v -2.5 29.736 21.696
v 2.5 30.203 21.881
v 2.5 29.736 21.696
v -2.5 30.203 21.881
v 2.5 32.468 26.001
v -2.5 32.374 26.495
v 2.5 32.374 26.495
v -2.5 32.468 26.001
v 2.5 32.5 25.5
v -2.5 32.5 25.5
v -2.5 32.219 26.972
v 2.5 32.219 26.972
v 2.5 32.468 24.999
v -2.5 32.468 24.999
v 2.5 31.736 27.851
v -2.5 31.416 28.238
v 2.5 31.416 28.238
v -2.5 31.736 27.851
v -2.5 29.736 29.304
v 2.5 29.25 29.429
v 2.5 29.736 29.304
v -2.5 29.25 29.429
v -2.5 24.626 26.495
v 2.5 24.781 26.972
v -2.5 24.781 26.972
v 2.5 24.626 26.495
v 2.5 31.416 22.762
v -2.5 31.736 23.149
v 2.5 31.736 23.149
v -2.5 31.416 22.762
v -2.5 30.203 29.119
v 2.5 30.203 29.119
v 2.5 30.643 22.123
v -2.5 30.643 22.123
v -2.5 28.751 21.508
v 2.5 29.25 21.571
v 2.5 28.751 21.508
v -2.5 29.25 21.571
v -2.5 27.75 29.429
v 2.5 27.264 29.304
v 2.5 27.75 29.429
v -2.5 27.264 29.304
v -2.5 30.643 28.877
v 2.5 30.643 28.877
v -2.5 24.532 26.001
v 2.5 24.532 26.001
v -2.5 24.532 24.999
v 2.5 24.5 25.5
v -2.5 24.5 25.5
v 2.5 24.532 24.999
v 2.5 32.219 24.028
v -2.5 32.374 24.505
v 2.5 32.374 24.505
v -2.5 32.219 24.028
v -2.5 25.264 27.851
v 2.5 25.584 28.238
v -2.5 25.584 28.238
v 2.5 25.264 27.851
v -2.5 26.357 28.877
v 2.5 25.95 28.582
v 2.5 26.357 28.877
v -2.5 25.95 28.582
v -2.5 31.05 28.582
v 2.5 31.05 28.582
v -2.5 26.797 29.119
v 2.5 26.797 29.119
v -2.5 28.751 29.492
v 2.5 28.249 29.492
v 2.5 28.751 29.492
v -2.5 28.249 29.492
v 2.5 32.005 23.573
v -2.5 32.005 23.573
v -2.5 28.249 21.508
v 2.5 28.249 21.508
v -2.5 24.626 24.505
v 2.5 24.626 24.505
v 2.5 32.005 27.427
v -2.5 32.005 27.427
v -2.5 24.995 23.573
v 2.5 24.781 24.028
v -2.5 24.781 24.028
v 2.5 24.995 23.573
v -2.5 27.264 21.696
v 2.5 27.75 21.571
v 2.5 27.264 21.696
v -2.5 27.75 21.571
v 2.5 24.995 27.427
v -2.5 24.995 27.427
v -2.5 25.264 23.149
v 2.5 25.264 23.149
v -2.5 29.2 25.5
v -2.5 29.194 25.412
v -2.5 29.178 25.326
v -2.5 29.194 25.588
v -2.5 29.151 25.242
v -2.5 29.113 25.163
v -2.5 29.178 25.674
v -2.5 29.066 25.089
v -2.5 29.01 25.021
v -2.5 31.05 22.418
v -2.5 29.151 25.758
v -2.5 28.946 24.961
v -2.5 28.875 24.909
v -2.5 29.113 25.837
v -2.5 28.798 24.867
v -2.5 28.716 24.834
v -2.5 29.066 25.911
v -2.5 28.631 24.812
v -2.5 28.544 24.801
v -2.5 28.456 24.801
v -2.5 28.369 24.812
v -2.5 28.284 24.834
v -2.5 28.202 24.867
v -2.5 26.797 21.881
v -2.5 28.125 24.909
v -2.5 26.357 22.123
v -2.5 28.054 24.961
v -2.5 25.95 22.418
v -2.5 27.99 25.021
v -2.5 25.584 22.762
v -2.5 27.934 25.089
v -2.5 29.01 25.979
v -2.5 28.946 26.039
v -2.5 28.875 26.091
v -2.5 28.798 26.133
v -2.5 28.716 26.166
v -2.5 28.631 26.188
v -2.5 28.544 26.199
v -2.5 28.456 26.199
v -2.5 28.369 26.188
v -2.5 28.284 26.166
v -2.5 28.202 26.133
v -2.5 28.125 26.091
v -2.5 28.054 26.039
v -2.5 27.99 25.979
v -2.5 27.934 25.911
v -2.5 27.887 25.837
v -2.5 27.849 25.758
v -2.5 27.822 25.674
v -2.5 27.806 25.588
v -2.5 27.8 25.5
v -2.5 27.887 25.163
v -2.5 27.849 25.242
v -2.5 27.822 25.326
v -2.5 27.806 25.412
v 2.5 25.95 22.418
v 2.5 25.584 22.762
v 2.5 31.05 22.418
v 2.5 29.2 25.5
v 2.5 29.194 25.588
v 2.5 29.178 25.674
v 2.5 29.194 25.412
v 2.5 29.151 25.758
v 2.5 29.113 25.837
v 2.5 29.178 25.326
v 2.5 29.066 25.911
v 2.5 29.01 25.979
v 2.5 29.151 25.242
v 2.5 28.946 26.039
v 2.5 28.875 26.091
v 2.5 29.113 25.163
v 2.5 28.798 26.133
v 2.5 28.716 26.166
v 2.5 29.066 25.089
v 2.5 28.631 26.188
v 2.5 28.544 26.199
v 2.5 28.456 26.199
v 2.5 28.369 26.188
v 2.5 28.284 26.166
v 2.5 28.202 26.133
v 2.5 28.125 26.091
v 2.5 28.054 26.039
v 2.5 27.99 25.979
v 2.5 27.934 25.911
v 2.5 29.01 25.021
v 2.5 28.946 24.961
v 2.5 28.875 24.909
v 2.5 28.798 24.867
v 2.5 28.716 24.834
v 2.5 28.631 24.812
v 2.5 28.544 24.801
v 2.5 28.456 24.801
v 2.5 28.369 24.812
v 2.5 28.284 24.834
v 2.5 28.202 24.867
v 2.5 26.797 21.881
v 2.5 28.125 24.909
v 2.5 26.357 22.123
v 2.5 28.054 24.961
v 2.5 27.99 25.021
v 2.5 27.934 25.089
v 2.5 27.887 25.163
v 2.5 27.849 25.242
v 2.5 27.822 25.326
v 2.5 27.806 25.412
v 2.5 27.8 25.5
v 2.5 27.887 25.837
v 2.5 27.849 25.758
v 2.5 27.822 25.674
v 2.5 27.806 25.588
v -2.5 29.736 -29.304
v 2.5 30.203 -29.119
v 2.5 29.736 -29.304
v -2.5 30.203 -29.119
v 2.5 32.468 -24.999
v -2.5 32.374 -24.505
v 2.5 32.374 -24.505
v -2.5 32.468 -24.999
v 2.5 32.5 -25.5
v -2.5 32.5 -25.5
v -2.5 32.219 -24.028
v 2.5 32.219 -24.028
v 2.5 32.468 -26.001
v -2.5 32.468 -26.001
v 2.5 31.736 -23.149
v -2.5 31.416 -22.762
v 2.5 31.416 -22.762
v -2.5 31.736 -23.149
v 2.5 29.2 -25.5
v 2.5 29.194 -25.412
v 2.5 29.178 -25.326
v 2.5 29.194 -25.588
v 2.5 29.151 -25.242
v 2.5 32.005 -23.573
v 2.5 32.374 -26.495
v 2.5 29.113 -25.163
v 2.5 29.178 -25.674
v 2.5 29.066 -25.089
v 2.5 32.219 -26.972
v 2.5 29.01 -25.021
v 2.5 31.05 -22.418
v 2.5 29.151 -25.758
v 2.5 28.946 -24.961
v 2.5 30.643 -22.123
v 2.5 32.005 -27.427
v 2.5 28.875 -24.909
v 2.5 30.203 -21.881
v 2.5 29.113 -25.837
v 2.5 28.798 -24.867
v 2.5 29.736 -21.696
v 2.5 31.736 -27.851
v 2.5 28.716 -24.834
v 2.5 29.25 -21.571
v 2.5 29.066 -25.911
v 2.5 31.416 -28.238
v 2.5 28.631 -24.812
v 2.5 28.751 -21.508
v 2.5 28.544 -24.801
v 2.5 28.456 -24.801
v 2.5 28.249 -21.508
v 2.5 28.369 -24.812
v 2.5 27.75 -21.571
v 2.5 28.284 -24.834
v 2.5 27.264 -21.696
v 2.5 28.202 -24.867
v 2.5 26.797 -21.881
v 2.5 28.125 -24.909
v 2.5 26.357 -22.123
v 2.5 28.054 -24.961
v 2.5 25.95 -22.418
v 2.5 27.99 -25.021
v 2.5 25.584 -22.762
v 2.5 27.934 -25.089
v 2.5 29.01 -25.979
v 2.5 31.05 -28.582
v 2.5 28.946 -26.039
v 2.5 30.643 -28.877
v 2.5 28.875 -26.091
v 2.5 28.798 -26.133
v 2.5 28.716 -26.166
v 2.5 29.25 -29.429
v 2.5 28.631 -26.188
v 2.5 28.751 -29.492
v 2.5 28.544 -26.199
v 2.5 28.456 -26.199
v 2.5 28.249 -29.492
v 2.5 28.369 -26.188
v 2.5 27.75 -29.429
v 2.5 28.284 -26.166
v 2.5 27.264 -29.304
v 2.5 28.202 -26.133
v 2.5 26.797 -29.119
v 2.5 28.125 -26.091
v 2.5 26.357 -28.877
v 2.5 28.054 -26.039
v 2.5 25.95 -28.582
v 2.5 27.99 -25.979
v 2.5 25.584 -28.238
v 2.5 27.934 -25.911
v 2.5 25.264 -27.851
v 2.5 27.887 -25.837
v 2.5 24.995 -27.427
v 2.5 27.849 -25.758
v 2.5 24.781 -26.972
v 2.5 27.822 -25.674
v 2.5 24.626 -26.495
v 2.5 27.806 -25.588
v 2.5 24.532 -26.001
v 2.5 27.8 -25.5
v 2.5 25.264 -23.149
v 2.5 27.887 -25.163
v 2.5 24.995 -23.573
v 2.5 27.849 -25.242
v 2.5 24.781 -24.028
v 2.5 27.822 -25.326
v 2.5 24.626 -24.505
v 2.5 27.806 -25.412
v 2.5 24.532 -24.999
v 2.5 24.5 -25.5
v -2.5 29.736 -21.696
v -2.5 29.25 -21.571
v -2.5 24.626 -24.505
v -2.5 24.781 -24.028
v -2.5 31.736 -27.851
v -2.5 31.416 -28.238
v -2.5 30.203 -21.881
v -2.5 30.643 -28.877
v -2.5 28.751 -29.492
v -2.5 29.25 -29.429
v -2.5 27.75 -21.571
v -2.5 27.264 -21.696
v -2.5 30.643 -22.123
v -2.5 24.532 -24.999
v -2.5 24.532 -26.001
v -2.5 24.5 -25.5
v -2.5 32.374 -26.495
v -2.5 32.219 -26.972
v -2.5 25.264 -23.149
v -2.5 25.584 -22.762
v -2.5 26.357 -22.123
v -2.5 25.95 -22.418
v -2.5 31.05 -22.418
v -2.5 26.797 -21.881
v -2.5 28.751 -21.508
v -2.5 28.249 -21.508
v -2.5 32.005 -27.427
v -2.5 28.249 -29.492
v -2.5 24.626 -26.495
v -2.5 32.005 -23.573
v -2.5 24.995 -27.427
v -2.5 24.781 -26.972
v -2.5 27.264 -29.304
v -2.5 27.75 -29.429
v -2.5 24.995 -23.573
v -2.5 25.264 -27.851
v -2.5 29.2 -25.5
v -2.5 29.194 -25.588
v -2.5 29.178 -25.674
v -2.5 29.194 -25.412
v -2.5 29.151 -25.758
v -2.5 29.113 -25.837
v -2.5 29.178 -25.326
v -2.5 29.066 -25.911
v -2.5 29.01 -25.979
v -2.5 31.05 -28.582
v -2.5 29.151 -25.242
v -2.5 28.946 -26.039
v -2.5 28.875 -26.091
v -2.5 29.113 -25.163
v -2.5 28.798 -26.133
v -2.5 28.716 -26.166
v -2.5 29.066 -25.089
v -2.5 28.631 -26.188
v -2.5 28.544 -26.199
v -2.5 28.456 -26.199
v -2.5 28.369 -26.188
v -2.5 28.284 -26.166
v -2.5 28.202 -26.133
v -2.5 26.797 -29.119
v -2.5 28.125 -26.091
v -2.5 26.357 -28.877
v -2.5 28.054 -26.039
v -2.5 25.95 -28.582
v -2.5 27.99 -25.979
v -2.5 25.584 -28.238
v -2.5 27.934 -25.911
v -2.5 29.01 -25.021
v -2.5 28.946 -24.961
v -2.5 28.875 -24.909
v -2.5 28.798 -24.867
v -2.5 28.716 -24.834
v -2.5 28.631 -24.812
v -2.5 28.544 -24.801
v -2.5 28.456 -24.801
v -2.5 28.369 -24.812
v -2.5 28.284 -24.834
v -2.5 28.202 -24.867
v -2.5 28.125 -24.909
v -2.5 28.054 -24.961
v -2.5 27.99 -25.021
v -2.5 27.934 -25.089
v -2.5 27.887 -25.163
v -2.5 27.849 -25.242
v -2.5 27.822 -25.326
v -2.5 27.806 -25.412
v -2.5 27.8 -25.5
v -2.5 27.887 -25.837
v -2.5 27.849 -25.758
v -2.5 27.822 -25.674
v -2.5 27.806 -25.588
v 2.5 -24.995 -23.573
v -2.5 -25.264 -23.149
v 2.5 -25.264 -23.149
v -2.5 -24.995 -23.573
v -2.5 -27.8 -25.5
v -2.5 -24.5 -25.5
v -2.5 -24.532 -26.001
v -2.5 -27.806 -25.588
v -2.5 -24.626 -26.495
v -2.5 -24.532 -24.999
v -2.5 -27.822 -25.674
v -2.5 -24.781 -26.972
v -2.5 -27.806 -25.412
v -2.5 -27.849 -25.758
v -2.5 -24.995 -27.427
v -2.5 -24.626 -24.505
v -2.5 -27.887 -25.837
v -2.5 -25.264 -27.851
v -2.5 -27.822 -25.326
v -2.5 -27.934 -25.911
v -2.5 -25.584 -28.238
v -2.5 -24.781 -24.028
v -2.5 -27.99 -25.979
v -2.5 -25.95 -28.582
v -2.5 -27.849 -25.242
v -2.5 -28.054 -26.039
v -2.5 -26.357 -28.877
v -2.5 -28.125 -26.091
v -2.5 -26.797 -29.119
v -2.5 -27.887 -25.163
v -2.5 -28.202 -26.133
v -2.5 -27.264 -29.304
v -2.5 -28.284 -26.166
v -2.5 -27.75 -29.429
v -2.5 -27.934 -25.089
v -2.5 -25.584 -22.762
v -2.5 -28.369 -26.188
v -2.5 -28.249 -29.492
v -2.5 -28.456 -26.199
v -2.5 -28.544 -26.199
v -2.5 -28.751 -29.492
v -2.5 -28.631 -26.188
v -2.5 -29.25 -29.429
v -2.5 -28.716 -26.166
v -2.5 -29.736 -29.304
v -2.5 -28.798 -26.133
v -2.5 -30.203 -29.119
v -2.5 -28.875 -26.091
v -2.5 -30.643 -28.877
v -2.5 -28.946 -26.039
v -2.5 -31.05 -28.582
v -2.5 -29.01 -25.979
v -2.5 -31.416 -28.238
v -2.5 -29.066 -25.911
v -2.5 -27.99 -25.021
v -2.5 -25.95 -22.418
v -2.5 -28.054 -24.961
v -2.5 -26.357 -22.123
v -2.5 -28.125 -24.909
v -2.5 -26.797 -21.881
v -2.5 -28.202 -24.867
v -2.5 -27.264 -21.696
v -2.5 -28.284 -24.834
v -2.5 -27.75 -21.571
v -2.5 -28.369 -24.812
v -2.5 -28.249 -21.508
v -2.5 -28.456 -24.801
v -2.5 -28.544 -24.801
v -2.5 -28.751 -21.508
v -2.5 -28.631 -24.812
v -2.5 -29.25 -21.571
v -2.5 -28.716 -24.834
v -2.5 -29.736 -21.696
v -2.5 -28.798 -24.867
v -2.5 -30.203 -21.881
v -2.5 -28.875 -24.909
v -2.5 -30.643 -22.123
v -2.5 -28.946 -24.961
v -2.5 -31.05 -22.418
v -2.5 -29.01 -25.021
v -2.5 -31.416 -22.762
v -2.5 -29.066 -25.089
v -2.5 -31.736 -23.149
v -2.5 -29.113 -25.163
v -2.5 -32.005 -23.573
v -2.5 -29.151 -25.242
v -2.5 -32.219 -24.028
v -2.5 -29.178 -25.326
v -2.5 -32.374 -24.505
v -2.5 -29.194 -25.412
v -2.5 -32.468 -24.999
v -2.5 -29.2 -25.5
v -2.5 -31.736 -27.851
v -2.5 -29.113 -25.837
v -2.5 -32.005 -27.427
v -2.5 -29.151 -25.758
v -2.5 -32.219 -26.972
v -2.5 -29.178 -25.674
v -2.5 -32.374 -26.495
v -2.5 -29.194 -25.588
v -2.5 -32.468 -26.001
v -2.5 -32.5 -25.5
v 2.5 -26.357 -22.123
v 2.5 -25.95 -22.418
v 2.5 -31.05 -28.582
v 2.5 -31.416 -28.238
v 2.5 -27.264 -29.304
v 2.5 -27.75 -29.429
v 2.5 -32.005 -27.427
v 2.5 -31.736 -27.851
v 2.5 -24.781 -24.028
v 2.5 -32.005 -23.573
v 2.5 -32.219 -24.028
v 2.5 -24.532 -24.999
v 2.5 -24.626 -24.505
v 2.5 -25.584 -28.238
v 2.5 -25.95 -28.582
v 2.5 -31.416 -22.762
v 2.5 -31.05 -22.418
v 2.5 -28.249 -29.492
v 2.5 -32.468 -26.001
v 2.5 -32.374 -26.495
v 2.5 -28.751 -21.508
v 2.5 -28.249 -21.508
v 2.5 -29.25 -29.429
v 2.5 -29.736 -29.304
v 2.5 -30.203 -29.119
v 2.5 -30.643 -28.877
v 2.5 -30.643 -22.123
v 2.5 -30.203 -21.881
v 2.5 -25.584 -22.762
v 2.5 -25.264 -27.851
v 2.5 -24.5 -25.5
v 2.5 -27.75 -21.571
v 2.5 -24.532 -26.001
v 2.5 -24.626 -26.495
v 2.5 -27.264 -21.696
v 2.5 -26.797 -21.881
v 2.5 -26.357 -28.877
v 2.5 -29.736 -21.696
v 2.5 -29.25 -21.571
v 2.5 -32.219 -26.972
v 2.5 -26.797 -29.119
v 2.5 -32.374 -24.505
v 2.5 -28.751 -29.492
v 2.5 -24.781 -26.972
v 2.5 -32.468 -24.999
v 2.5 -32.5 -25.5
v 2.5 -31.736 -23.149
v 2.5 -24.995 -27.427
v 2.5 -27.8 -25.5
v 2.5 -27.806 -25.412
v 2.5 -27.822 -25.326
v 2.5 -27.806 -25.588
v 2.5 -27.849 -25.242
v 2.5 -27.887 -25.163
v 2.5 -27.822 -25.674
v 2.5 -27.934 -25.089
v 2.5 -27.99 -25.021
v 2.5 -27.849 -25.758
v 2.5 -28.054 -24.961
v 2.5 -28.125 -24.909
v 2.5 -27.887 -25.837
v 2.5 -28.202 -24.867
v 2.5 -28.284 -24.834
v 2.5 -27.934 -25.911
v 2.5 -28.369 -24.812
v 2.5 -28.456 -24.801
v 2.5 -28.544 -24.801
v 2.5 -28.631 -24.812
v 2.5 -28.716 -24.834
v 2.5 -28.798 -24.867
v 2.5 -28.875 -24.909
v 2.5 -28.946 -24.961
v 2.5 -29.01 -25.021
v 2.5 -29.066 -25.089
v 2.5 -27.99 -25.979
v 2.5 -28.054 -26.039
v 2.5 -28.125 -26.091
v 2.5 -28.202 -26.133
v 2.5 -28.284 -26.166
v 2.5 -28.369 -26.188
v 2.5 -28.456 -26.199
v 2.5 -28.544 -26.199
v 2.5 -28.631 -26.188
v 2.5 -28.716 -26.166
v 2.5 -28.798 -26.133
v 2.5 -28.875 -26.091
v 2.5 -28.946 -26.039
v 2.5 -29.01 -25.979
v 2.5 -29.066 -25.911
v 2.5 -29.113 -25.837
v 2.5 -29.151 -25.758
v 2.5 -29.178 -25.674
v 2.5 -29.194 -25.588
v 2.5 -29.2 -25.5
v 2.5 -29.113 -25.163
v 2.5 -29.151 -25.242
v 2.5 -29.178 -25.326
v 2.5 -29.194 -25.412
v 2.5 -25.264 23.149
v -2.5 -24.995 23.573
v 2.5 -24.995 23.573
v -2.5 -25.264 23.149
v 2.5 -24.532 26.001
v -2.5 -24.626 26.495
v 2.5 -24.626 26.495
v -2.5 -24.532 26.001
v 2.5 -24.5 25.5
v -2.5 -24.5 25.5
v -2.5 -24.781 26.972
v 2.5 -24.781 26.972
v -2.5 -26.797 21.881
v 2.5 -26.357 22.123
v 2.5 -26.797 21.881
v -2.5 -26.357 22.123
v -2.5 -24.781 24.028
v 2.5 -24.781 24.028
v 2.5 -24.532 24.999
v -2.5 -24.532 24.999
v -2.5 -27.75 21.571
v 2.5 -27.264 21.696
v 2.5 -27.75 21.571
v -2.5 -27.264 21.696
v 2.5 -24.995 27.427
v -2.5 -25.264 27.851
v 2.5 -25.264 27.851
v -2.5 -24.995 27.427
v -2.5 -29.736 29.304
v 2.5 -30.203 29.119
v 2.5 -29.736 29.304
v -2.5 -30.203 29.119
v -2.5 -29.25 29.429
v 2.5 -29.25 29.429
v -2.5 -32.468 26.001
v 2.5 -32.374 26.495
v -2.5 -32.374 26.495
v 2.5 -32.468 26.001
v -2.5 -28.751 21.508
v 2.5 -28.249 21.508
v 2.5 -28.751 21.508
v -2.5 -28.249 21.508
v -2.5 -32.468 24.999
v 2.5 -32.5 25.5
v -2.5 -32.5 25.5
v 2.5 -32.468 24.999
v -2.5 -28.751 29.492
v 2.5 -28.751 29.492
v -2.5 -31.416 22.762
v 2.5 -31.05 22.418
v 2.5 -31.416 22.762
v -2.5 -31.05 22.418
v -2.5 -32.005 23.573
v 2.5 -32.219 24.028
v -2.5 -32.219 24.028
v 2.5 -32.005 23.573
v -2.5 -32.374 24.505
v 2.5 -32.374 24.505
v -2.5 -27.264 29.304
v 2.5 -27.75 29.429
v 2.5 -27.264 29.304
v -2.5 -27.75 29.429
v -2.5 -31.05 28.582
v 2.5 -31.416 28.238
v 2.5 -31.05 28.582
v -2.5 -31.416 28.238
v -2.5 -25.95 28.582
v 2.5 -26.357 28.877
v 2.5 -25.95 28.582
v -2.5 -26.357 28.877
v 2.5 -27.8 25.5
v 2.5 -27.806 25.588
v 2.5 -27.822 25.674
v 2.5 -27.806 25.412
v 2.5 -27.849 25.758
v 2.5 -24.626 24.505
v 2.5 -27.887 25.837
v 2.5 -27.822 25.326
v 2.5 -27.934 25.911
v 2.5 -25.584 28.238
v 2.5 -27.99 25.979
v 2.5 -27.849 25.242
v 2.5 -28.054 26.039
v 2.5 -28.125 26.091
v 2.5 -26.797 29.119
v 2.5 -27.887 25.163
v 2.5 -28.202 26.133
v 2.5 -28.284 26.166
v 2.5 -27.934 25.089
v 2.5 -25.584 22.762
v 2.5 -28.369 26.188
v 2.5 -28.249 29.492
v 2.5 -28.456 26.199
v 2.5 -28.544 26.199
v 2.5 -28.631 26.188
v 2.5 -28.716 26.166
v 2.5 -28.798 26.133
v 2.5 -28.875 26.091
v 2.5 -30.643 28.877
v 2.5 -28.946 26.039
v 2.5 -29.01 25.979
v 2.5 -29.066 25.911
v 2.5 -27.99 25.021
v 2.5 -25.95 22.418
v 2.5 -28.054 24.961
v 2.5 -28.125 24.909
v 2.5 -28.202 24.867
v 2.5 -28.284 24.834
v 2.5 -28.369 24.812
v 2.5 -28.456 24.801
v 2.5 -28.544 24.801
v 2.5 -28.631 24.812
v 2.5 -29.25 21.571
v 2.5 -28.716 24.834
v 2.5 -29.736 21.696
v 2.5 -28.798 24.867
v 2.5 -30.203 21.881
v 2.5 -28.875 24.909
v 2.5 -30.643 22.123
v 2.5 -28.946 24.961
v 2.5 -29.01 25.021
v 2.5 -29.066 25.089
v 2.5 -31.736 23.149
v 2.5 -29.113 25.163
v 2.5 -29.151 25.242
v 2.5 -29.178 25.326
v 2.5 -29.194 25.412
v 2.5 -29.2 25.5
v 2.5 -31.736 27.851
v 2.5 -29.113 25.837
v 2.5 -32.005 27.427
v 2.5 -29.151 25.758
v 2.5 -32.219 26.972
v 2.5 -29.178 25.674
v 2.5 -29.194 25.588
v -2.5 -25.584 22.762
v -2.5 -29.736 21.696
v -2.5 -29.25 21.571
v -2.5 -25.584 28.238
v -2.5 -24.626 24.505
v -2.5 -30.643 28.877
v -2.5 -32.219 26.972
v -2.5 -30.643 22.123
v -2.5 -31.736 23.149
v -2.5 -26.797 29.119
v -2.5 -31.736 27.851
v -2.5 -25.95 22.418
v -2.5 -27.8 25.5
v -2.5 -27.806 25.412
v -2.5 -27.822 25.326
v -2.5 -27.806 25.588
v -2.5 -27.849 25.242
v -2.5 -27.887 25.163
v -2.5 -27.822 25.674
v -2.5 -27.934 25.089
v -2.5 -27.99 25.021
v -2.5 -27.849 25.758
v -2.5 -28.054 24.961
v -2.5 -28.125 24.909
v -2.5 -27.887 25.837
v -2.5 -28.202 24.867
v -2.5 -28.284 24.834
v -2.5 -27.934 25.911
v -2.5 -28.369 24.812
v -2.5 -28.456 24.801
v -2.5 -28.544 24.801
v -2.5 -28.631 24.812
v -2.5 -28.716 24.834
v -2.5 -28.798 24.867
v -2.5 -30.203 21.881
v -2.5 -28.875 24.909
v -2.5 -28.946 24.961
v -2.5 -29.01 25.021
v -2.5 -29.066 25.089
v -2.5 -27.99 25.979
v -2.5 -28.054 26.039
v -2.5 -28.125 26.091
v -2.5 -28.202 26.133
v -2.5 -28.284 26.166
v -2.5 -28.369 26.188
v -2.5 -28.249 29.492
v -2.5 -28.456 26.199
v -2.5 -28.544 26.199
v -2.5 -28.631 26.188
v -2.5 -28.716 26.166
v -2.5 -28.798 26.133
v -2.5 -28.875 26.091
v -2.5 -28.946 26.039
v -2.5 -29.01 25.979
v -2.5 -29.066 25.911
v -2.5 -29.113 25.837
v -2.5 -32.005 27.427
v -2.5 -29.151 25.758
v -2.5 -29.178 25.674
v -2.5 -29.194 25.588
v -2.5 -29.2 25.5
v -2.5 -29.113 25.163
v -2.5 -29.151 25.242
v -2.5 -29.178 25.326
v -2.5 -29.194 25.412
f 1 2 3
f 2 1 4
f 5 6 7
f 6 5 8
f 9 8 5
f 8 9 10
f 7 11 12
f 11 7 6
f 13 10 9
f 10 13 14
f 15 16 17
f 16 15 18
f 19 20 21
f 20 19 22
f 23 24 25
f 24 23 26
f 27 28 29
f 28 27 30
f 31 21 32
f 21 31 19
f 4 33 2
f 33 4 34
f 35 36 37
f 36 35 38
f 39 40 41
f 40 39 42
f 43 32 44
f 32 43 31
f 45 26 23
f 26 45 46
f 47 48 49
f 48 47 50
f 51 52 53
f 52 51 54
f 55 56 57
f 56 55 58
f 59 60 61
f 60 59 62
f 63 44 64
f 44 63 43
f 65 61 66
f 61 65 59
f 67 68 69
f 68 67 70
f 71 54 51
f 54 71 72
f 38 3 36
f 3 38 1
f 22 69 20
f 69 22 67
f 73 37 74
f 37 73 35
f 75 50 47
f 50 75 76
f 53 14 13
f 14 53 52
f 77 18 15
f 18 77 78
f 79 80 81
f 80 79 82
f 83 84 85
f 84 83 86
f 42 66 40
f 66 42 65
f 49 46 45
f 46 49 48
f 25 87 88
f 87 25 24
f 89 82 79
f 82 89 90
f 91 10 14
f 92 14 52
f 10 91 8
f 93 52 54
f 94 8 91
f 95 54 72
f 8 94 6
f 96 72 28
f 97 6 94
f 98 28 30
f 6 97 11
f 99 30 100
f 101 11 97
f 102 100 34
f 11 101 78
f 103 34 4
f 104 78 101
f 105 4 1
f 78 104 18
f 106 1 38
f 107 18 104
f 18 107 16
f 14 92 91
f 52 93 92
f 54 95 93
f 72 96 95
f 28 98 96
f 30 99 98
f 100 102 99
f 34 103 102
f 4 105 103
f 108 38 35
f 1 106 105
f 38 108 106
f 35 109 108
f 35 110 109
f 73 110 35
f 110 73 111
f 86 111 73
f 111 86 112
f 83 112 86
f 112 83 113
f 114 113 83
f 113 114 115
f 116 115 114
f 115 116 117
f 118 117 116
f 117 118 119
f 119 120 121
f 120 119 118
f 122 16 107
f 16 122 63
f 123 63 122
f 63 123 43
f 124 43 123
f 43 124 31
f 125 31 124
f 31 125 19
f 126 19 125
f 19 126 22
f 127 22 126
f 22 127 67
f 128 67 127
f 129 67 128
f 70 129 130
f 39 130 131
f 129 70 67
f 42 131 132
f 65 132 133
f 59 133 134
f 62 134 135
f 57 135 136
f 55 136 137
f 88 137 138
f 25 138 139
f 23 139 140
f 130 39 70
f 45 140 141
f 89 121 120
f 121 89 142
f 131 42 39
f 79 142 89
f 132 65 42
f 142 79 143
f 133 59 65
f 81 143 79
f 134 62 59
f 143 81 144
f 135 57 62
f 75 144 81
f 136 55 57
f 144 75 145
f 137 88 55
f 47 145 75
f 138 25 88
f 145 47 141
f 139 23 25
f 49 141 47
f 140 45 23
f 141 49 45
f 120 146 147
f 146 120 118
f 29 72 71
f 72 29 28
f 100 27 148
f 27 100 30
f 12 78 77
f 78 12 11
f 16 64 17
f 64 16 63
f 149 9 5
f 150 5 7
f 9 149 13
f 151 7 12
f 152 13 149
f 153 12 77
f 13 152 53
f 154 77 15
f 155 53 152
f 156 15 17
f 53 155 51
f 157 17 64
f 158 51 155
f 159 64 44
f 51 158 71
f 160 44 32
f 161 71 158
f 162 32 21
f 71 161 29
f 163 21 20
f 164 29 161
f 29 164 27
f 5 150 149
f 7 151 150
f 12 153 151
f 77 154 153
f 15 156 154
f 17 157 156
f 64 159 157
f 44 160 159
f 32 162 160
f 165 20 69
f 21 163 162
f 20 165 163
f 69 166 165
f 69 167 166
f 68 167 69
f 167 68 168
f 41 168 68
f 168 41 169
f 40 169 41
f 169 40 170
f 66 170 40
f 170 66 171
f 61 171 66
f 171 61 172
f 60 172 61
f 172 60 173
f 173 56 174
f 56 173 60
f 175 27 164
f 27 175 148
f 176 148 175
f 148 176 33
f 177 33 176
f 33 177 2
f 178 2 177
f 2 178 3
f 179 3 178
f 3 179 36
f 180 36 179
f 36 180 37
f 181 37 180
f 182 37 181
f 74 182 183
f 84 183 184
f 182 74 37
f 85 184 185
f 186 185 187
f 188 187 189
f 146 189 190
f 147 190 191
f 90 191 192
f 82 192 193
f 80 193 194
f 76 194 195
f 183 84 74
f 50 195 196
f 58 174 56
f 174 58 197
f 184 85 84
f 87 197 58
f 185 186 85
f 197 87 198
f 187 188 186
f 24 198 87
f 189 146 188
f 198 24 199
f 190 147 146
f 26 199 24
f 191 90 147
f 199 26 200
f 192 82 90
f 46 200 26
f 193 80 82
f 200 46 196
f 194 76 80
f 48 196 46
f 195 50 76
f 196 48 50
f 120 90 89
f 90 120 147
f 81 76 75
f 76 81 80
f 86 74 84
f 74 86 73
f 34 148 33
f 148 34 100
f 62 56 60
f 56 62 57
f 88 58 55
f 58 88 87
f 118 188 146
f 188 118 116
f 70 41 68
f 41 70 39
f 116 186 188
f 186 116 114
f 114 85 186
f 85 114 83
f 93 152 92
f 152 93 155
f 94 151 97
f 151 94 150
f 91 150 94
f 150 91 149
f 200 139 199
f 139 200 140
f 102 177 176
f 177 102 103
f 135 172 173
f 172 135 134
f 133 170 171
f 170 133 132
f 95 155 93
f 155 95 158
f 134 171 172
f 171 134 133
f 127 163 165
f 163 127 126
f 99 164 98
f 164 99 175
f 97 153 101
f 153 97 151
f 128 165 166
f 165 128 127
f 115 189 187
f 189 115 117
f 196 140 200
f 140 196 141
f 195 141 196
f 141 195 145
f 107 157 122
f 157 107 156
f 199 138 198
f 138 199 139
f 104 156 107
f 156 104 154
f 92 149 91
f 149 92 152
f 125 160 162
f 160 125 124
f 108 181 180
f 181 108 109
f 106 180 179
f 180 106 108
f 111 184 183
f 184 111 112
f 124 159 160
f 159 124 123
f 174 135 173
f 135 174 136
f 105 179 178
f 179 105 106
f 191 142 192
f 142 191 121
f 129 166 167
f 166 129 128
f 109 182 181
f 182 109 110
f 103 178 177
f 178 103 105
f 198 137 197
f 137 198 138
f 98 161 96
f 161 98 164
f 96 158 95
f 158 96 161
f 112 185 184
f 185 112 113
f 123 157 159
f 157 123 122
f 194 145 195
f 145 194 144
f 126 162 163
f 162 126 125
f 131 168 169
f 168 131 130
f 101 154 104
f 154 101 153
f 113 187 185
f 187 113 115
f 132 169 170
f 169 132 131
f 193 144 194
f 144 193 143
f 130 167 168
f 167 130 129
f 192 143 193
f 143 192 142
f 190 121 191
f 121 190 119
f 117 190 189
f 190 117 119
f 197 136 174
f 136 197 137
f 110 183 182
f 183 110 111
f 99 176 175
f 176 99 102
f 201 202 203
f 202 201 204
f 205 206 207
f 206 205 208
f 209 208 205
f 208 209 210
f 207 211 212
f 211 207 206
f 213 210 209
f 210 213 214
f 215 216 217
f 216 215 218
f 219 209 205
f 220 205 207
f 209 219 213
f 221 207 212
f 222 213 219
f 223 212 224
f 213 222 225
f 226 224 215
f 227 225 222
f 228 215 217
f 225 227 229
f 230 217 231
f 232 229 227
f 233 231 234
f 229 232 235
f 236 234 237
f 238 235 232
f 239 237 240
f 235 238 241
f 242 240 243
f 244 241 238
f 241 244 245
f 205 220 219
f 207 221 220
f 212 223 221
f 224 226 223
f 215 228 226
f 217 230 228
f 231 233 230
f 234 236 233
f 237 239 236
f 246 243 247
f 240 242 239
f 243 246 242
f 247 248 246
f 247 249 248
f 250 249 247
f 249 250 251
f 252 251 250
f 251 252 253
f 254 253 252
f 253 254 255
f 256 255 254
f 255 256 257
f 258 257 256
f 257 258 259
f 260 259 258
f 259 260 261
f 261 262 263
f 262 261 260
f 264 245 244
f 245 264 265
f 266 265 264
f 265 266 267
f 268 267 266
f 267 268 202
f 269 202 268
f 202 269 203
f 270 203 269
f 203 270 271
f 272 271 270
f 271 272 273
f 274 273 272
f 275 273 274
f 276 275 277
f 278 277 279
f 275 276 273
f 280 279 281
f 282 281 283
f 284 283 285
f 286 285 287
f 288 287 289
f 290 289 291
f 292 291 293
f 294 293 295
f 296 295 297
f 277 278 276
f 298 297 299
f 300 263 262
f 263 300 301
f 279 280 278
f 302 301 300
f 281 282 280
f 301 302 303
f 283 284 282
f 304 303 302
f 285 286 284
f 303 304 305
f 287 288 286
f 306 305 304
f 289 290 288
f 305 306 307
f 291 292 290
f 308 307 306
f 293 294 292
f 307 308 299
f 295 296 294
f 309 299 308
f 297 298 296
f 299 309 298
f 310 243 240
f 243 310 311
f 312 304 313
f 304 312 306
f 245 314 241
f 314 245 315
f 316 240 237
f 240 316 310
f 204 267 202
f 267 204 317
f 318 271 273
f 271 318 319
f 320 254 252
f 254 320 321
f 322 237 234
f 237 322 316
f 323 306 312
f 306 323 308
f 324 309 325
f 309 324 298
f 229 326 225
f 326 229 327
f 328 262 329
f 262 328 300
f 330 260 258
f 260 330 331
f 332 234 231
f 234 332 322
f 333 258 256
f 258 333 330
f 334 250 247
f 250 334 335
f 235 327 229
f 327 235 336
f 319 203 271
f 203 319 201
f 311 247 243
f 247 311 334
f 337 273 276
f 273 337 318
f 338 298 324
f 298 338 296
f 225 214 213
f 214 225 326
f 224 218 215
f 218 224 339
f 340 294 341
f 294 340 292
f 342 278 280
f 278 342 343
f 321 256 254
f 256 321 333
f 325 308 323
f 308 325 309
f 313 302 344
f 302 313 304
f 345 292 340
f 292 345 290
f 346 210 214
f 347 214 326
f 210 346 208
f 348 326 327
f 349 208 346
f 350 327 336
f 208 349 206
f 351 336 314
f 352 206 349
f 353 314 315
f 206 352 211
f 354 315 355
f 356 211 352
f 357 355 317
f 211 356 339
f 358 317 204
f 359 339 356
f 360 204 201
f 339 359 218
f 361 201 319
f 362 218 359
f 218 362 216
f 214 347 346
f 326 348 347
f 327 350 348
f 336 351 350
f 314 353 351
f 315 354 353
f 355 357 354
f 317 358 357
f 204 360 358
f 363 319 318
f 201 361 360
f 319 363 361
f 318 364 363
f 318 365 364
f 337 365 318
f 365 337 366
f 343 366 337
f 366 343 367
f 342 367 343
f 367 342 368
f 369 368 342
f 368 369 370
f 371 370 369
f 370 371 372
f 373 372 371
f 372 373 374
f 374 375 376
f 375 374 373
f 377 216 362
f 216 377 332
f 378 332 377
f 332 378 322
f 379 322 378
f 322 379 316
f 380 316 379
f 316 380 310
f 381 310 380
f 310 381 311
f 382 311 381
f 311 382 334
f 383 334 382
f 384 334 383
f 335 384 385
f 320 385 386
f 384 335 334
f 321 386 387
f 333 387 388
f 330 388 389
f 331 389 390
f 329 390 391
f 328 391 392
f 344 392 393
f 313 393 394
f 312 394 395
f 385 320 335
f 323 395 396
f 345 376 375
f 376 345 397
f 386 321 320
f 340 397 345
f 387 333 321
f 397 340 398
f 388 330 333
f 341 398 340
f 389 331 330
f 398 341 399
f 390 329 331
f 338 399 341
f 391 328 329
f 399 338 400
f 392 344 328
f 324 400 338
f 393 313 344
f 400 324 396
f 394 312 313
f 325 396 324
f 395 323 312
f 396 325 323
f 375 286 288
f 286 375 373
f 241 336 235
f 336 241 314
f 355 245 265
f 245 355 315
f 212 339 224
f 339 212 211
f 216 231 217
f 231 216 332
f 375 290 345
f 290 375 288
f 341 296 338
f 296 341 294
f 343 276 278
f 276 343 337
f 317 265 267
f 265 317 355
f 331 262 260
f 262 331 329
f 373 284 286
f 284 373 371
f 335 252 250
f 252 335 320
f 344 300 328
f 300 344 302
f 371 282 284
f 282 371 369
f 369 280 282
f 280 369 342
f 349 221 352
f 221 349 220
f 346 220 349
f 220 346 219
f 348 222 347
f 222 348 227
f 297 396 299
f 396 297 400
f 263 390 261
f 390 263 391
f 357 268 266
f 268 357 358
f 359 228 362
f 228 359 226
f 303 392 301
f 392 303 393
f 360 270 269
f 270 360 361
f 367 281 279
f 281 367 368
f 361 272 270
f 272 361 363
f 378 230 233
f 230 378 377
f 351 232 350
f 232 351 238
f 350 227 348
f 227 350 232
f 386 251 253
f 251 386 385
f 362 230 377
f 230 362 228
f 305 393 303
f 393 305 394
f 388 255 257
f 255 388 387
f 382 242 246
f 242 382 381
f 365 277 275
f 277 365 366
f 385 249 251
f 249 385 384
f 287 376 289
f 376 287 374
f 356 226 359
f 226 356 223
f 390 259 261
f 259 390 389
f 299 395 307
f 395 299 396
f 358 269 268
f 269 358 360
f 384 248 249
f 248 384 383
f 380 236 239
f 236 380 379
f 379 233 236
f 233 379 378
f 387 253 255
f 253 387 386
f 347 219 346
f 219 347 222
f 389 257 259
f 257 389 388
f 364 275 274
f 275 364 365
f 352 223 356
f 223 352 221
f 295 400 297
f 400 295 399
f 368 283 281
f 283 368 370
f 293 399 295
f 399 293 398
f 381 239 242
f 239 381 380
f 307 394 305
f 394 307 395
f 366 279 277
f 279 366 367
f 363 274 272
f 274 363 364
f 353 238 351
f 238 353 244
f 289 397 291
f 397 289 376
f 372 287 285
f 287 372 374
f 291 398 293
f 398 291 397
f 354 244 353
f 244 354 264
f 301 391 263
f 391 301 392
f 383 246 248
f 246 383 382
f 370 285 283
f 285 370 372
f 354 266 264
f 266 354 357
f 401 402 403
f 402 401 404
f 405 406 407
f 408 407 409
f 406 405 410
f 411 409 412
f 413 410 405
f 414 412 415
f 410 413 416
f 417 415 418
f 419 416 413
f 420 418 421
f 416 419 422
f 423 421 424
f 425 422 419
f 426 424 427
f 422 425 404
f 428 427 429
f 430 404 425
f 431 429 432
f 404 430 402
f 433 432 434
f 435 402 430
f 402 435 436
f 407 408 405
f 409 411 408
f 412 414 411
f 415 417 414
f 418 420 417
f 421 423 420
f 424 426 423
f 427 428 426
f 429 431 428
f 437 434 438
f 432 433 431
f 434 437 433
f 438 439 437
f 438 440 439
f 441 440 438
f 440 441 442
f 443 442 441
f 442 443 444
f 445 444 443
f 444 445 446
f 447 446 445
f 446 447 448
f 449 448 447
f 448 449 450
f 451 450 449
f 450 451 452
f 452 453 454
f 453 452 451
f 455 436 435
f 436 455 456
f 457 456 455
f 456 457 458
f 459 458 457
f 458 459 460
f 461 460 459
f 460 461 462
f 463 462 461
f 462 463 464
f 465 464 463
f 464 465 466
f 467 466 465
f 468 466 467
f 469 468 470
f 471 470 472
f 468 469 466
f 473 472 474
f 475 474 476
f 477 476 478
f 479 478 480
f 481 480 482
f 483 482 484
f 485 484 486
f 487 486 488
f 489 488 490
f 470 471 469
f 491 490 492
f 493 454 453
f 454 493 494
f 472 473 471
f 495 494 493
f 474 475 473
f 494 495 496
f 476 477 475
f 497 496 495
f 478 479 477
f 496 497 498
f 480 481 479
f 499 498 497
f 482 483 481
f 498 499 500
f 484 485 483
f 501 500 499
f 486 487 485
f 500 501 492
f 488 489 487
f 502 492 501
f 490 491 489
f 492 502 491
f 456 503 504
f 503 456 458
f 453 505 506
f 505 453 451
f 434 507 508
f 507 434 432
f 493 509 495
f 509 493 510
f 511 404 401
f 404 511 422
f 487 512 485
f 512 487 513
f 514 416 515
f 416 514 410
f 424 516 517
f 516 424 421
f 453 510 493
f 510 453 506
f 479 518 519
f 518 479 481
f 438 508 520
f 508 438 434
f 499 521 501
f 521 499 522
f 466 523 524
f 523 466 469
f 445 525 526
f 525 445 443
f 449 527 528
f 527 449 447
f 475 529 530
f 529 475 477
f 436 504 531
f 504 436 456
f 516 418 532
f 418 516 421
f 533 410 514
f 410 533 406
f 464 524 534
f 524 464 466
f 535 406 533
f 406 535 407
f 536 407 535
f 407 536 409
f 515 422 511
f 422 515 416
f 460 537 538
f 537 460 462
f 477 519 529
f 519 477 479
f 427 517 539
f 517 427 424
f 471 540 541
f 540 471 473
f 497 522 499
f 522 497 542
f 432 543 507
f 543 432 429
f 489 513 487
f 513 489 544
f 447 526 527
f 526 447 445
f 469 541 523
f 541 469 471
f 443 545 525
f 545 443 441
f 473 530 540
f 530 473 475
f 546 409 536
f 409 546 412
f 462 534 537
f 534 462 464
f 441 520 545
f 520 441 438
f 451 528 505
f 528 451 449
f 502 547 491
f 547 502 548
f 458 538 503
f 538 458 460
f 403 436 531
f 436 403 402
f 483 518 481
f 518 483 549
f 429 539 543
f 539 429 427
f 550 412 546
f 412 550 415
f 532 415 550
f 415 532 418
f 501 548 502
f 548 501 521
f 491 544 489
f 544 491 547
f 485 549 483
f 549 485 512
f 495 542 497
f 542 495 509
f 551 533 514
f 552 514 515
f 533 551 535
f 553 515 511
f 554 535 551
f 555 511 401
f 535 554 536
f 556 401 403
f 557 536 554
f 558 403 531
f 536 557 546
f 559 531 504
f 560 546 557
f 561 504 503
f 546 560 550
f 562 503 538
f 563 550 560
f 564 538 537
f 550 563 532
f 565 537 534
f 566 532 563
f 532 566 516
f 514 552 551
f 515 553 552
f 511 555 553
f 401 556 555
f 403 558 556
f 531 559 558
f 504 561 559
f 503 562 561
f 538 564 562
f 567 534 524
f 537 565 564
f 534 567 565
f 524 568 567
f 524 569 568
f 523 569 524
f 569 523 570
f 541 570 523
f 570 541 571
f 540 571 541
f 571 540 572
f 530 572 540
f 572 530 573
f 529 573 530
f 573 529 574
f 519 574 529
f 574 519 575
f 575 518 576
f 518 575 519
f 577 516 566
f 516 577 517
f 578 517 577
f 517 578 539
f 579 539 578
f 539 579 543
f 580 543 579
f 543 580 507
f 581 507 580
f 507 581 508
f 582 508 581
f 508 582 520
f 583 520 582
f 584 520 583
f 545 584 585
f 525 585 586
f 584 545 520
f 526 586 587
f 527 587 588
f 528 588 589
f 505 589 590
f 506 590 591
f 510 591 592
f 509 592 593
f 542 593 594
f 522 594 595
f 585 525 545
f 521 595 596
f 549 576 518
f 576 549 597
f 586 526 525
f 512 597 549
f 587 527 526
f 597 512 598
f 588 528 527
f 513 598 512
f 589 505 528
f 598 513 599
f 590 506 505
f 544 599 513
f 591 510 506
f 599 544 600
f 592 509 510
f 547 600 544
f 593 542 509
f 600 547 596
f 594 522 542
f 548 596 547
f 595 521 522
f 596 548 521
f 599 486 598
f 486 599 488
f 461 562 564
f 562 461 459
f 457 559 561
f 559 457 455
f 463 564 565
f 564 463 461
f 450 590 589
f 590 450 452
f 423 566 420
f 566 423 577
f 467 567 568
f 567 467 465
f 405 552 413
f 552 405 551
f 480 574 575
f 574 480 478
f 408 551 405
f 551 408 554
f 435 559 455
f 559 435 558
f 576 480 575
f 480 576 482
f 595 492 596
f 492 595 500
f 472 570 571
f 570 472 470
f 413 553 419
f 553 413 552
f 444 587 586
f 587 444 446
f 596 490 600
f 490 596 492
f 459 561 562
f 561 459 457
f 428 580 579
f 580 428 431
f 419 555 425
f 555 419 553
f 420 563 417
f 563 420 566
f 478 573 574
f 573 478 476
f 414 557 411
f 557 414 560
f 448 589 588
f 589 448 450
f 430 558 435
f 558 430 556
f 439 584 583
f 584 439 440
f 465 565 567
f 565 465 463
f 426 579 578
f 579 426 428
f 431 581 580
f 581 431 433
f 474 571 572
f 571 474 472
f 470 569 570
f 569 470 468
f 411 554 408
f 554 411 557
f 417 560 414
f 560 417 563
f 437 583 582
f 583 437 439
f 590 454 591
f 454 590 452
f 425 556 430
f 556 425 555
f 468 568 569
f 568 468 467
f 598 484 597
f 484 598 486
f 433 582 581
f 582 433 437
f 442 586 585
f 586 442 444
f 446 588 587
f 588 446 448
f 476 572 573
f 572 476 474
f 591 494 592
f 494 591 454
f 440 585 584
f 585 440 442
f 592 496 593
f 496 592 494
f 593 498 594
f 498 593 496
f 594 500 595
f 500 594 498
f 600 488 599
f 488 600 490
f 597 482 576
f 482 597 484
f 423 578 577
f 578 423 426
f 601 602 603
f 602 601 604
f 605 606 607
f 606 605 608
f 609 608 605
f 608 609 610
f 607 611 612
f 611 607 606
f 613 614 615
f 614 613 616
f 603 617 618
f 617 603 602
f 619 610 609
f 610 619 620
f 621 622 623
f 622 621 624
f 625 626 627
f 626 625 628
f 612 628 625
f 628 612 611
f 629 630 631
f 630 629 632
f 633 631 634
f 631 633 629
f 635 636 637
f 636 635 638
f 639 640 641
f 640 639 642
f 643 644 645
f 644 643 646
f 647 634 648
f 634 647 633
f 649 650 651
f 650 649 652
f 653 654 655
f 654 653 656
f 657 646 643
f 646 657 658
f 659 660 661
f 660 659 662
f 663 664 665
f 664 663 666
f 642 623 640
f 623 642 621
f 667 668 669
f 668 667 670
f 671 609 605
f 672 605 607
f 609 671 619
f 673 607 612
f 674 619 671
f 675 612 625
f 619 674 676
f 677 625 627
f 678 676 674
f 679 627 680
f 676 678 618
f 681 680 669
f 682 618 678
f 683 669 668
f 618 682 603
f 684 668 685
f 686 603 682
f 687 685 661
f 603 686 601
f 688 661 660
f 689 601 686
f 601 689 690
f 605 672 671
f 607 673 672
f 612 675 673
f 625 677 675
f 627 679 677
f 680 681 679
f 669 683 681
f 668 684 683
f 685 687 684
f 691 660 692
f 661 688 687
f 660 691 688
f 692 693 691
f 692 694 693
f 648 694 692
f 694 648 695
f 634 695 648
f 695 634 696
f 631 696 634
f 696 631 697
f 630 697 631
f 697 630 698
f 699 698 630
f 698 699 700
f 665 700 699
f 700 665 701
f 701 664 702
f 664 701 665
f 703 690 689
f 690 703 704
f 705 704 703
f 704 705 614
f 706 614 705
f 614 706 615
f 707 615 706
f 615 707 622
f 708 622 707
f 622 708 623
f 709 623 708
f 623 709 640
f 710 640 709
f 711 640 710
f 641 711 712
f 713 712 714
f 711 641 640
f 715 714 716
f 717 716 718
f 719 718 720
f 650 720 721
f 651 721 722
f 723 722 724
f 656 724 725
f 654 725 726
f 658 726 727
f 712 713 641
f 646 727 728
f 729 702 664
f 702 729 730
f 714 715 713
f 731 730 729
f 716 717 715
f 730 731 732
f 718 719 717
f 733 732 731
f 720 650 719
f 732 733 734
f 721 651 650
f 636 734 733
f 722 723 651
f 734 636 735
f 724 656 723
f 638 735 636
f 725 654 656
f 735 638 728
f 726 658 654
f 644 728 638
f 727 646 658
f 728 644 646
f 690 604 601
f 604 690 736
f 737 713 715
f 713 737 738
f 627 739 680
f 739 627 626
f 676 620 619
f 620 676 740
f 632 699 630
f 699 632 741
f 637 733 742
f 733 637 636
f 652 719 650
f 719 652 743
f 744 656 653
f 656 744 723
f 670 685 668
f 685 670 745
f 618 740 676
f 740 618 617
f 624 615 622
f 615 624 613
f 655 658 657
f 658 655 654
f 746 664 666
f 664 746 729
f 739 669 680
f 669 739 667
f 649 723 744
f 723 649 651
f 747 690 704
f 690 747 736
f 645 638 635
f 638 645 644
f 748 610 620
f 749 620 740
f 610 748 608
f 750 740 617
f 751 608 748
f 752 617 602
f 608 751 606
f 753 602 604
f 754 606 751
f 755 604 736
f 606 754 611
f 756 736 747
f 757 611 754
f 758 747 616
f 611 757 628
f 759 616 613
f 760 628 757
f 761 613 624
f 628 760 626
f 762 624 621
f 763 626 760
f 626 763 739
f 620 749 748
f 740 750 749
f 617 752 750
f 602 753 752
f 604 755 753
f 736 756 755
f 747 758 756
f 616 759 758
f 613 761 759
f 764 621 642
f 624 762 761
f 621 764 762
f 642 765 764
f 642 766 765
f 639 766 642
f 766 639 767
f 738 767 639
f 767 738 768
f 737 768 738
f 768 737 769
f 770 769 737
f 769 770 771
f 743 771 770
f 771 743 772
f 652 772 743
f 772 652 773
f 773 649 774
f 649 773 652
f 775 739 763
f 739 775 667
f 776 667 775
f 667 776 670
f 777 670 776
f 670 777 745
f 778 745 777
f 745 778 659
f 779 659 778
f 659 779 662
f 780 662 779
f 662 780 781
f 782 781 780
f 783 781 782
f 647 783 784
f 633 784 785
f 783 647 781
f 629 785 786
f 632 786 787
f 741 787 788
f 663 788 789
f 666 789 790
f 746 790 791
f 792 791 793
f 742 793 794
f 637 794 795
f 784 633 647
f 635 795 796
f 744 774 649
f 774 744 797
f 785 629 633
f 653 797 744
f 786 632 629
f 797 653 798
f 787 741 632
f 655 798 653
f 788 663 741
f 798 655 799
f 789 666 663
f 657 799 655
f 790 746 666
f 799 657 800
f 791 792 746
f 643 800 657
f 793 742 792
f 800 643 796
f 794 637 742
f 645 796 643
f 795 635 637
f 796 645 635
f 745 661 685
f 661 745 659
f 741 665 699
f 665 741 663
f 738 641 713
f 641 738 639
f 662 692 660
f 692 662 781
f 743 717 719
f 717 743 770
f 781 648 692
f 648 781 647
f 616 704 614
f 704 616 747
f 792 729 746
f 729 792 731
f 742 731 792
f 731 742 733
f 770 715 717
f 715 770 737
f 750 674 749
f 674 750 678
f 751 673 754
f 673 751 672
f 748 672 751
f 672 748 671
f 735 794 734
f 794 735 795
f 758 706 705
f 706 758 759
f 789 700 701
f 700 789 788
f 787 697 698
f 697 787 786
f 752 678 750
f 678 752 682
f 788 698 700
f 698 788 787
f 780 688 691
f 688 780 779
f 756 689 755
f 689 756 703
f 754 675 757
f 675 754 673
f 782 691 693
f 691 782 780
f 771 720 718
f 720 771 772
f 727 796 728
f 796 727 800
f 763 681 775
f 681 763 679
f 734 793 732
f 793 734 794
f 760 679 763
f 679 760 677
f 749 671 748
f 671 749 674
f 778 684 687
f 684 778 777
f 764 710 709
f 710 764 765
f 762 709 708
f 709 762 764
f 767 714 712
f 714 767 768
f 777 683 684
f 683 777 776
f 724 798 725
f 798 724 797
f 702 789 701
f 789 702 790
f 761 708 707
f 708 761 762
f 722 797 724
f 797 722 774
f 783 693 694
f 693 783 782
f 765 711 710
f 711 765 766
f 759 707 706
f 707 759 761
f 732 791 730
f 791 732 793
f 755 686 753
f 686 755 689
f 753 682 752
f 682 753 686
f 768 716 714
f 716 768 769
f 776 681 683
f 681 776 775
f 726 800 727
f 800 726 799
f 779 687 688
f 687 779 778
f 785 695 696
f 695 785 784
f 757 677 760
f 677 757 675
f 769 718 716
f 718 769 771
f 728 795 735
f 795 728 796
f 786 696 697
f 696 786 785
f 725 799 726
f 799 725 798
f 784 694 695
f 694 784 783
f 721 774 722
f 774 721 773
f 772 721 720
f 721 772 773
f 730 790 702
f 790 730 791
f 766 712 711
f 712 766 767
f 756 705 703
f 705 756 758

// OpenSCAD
// file: ../robot_settings.scad
main_box_x = 95; // 96
main_box_y = 102;
main_box_z = 74; // 74.5
wall_thickness = 2;

rail_gap = 2;
rail_inset = 7;

rail_thickness = 7;
rail_length = 250;
rail_width = 200;

raspberry_pi_screw_seperation_y = 57;
raspberry_pi_screw_seperation_z = 48;
raspberry_pi_peg_h = 5;

battery_box_peg_h = 6;
battery_box_peg_d = 8;
battery_box_peg_cutout = 5;

gears_module = 1;
pinion_gear_teeth = 32;
pinion_gear_width = 5;
pinion_gear_bore = 8;

gears_setback_distance = 25;
gear_post_height = 2 * pinion_gear_width + rail_thickness + 8 ;

steering_motor_mount_x = 45;
steering_motor_mount_y = 36;
steering_motor_mount_z = 18;
steering_motor_mount_setback_distance = gears_setback_distance + 16;

dc_motor_drivertype = "Teyleten"; // Teyleten
isAdafruit = (dc_motor_drivertype == "Adafruit");

drv8871_x = isAdafruit ? 20.3 : 21.6;
drv8871_y = isAdafruit ?  24 : 25;

drv8871_z = 2;
drv8871_screw_d = 2.5;
drv8871_solder_points_z = 2;

drv8871mount_edge_x = 1.5;
drv8871mount_edge_wall = 3;
drv8871mount_z = 5;
drv8871mount_x = drv8871_x +  drv8871mount_edge_wall - 2* drv8871mount_edge_x;
drv8871mount_y = 19;

drv8871_screw_distance = 15.64;
drv8871_solder_points_d = 1.66;
drv8871_solder_offset_y = 4.4;
drv8871_solder_inner_points_distance = 5;
drv8871_solder_outer_points_distance = 12;

dc_motor_housing_minus_encoder_z = 48;
dc_motor_encoder_z = 9.33;
dc_motor_encoder_wheel_d = 13.4;
dc_motor_encoder_wheel_thickness = 5;
dc_motor_encoder_wheel_gap = 3;
dc_motor_encoder_circuit_thickness = 2;
dc_motor_cutout_d = 24.8;
dc_motor_cutout_z = 19.5;

dc_motor_screw_head_z = 2;
dc_motor_screw_head_d = 5.6;
dc_motor_screw_d = 3.2;
dc_motor_screw_offset = 8.5;

dc_motor_axle_ring_z = 3;
dc_motor_axle_ring_d = 7.2;
dc_motor_axle_cutout_d = 4.5;
dc_motor_axle_cutout_z = 10;
dc_motor_axle_notch_cutout = 0.4;
dc_motor_axle_notch_cutout_z = 6;

pdmount_x = 20;
pdmount_y = 30;
pdmount_z = 2;
pdmount_edge_x = 1.5;
pdmount_edge_wall = 3;

steering_shaft_z = 45;
steering_shaft_d = 7;
steering_shaft_motor_fitting_d = 9;
coupler_length = 24.6;
coupler_diameter = 14;
coupler_screw_d = 4;
coupler_screw_z_offset = 5;
coupler_gear_side_insert = 12.6;
steering_shaft_with_coupler_z = steering_shaft_z - coupler_gear_side_insert;

lidar_mount_y = 110;
lidar_mount_x = 65 + 20;
lidar_narrow_screws = 40;
lidar_wide_screws = 56;
lidar_front_to_back_screws = 70;
lidar_screw_d = 3;
lidar_circuitboard_x = 20;
lidar_circuitboard_y = 35;
lidar_circuitboard_z = 1.2;
lidar_cord_length = 29;

ball_bearing_height = 7;
ball_bearing_outer_diameter = 22;
ball_bearing_inner_diameter = 8;

 armature_holder_height = 20;
 armature_holder_thickness = 8;
pull_bar_peg_r = 3.2;
apparatus_locking_peg_d = 4;

rack_module = 1;
rack_length = main_box_x / 2;
rack_height = 10;
rack_width = 10;
rack_teeth = 30;
rack_bore = 3;

pull_bar_length = rail_width / 2 - rack_length + 1;

// tire hardware
axle_length = 30;
axle_reciever_inner_diameter = 7.75;
axle_reciever_length = 18.8;
axle_notch_length = 7;
axle_notch_cutout = 2.4;

// power distribution bar
power_bar_cutout_x = 96;
power_bar_y = 19.1;
power_bar_z = 1.5;
power_bar_screw_distance = 91.4;
power_bar_screw_d = 2.8;
power_bar_standoff_z = 5;
power_bar_standoff_d = 6.83;

// breadboard
breadboard_wall_thickness = 3;
breadboard_width = 55;
breadboard_length = 83;
breadboard_height = 10.5;
breadboard_notch_width = 4.2;
breadboard_longside_notch_separation = 58.2 - breadboard_notch_width / 2;
breadboard_shortside_notch_separation = 26.3 - breadboard_notch_width;

pico_expander_width = 63;
pico_expander_height = 57;
pico_screw_hole_offset = 3;
pico_screw_hole_d = 2.5;

usbhub_thickness = 11.7;
usbhub_depth = 37.5;
usbhub_width = 86.7;
usbhub_end_port_width = 14.8;
usbhub_end_port_height = 12;
usbhub_front_face_safe_zone_left = 15;
usbhub_front_face_safe_zone_right = 14.8;

switch_w = 16;
switch_cutout_d = 12.2;
switch_bump_h = 2;
switch_bump_l = 18.2;
// main file
include <../robot_settings.scad>
$fn = 50;

module pico_extender() {
  rotate([90, 0, 90])
  difference() {
      cube([pico_expander_width, pico_expander_height, 2], center = true);

      translate([pico_expander_width / 2 - pico_screw_hole_offset, pico_expander_height / 2 - pico_screw_hole_offset, 0])
      cylinder(5, d = pico_screw_hole_d, center = true);

      translate([pico_expander_width / 2 - pico_screw_hole_offset,  -pico_expander_height / 2 + pico_screw_hole_offset, 0])
      cylinder(5, d = pico_screw_hole_d, center = true);

      translate([- pico_expander_width / 2 + pico_screw_hole_offset,  -pico_expander_height / 2 + pico_screw_hole_offset, 0])
      cylinder(5, d = pico_screw_hole_d, center = true);

      translate([- pico_expander_width / 2 + pico_screw_hole_offset,  pico_expander_height / 2 - pico_screw_hole_offset, 0])
      cylinder(5, d = pico_screw_hole_d, center = true);
    }
}
//pico_extender();

module pico_mounts() {
  rotate([90, 0, 90])
  union() {
    difference() {
      // mount
      translate([pico_expander_width / 2 - pico_screw_hole_offset, pico_expander_height / 2 - pico_screw_hole_offset, 0])
       cylinder(raspberry_pi_peg_h, d = ball_bearing_inner_diameter, center = true);
      
      // pilot hole
       translate([pico_expander_width / 2 - pico_screw_hole_offset, pico_expander_height / 2 - pico_screw_hole_offset, 0])
        cylinder(raspberry_pi_peg_h, d =  power_bar_screw_d / 2, center = true);
      }

      difference() {
        // mount
        translate([pico_expander_width / 2 - pico_screw_hole_offset,  -pico_expander_height / 2 + pico_screw_hole_offset, 0])
        cylinder(raspberry_pi_peg_h, d = ball_bearing_inner_diameter, center = true);
        
        // pilot hole
        translate([pico_expander_width / 2 - pico_screw_hole_offset,  -pico_expander_height / 2 + pico_screw_hole_offset, 0])
        cylinder(raspberry_pi_peg_h, d = power_bar_screw_d / 2, center = true);
      }
    
    difference() {
      // mount
      translate([- pico_expander_width / 2 + pico_screw_hole_offset,  -pico_expander_height / 2 + pico_screw_hole_offset, 0])
      cylinder(raspberry_pi_peg_h, d = ball_bearing_inner_diameter, center = true);
      
      // pilot hole
      translate([- pico_expander_width / 2 + pico_screw_hole_offset,  -pico_expander_height / 2 + pico_screw_hole_offset, 0])
      cylinder(raspberry_pi_peg_h, d = power_bar_screw_d / 2, center = true);
    }
      
    difference()  {
      // mount
      translate([- pico_expander_width / 2 + pico_screw_hole_offset,  pico_expander_height / 2 - pico_screw_hole_offset, 0])
      cylinder(raspberry_pi_peg_h, d = ball_bearing_inner_diameter, center = true);
      
      //pilot hole
      translate([- pico_expander_width / 2 + pico_screw_hole_offset,  pico_expander_height / 2 - pico_screw_hole_offset, 0])
      cylinder(raspberry_pi_peg_h, d = power_bar_screw_d / 2, center = true);
      }
    }
}
 pico_mounts();
